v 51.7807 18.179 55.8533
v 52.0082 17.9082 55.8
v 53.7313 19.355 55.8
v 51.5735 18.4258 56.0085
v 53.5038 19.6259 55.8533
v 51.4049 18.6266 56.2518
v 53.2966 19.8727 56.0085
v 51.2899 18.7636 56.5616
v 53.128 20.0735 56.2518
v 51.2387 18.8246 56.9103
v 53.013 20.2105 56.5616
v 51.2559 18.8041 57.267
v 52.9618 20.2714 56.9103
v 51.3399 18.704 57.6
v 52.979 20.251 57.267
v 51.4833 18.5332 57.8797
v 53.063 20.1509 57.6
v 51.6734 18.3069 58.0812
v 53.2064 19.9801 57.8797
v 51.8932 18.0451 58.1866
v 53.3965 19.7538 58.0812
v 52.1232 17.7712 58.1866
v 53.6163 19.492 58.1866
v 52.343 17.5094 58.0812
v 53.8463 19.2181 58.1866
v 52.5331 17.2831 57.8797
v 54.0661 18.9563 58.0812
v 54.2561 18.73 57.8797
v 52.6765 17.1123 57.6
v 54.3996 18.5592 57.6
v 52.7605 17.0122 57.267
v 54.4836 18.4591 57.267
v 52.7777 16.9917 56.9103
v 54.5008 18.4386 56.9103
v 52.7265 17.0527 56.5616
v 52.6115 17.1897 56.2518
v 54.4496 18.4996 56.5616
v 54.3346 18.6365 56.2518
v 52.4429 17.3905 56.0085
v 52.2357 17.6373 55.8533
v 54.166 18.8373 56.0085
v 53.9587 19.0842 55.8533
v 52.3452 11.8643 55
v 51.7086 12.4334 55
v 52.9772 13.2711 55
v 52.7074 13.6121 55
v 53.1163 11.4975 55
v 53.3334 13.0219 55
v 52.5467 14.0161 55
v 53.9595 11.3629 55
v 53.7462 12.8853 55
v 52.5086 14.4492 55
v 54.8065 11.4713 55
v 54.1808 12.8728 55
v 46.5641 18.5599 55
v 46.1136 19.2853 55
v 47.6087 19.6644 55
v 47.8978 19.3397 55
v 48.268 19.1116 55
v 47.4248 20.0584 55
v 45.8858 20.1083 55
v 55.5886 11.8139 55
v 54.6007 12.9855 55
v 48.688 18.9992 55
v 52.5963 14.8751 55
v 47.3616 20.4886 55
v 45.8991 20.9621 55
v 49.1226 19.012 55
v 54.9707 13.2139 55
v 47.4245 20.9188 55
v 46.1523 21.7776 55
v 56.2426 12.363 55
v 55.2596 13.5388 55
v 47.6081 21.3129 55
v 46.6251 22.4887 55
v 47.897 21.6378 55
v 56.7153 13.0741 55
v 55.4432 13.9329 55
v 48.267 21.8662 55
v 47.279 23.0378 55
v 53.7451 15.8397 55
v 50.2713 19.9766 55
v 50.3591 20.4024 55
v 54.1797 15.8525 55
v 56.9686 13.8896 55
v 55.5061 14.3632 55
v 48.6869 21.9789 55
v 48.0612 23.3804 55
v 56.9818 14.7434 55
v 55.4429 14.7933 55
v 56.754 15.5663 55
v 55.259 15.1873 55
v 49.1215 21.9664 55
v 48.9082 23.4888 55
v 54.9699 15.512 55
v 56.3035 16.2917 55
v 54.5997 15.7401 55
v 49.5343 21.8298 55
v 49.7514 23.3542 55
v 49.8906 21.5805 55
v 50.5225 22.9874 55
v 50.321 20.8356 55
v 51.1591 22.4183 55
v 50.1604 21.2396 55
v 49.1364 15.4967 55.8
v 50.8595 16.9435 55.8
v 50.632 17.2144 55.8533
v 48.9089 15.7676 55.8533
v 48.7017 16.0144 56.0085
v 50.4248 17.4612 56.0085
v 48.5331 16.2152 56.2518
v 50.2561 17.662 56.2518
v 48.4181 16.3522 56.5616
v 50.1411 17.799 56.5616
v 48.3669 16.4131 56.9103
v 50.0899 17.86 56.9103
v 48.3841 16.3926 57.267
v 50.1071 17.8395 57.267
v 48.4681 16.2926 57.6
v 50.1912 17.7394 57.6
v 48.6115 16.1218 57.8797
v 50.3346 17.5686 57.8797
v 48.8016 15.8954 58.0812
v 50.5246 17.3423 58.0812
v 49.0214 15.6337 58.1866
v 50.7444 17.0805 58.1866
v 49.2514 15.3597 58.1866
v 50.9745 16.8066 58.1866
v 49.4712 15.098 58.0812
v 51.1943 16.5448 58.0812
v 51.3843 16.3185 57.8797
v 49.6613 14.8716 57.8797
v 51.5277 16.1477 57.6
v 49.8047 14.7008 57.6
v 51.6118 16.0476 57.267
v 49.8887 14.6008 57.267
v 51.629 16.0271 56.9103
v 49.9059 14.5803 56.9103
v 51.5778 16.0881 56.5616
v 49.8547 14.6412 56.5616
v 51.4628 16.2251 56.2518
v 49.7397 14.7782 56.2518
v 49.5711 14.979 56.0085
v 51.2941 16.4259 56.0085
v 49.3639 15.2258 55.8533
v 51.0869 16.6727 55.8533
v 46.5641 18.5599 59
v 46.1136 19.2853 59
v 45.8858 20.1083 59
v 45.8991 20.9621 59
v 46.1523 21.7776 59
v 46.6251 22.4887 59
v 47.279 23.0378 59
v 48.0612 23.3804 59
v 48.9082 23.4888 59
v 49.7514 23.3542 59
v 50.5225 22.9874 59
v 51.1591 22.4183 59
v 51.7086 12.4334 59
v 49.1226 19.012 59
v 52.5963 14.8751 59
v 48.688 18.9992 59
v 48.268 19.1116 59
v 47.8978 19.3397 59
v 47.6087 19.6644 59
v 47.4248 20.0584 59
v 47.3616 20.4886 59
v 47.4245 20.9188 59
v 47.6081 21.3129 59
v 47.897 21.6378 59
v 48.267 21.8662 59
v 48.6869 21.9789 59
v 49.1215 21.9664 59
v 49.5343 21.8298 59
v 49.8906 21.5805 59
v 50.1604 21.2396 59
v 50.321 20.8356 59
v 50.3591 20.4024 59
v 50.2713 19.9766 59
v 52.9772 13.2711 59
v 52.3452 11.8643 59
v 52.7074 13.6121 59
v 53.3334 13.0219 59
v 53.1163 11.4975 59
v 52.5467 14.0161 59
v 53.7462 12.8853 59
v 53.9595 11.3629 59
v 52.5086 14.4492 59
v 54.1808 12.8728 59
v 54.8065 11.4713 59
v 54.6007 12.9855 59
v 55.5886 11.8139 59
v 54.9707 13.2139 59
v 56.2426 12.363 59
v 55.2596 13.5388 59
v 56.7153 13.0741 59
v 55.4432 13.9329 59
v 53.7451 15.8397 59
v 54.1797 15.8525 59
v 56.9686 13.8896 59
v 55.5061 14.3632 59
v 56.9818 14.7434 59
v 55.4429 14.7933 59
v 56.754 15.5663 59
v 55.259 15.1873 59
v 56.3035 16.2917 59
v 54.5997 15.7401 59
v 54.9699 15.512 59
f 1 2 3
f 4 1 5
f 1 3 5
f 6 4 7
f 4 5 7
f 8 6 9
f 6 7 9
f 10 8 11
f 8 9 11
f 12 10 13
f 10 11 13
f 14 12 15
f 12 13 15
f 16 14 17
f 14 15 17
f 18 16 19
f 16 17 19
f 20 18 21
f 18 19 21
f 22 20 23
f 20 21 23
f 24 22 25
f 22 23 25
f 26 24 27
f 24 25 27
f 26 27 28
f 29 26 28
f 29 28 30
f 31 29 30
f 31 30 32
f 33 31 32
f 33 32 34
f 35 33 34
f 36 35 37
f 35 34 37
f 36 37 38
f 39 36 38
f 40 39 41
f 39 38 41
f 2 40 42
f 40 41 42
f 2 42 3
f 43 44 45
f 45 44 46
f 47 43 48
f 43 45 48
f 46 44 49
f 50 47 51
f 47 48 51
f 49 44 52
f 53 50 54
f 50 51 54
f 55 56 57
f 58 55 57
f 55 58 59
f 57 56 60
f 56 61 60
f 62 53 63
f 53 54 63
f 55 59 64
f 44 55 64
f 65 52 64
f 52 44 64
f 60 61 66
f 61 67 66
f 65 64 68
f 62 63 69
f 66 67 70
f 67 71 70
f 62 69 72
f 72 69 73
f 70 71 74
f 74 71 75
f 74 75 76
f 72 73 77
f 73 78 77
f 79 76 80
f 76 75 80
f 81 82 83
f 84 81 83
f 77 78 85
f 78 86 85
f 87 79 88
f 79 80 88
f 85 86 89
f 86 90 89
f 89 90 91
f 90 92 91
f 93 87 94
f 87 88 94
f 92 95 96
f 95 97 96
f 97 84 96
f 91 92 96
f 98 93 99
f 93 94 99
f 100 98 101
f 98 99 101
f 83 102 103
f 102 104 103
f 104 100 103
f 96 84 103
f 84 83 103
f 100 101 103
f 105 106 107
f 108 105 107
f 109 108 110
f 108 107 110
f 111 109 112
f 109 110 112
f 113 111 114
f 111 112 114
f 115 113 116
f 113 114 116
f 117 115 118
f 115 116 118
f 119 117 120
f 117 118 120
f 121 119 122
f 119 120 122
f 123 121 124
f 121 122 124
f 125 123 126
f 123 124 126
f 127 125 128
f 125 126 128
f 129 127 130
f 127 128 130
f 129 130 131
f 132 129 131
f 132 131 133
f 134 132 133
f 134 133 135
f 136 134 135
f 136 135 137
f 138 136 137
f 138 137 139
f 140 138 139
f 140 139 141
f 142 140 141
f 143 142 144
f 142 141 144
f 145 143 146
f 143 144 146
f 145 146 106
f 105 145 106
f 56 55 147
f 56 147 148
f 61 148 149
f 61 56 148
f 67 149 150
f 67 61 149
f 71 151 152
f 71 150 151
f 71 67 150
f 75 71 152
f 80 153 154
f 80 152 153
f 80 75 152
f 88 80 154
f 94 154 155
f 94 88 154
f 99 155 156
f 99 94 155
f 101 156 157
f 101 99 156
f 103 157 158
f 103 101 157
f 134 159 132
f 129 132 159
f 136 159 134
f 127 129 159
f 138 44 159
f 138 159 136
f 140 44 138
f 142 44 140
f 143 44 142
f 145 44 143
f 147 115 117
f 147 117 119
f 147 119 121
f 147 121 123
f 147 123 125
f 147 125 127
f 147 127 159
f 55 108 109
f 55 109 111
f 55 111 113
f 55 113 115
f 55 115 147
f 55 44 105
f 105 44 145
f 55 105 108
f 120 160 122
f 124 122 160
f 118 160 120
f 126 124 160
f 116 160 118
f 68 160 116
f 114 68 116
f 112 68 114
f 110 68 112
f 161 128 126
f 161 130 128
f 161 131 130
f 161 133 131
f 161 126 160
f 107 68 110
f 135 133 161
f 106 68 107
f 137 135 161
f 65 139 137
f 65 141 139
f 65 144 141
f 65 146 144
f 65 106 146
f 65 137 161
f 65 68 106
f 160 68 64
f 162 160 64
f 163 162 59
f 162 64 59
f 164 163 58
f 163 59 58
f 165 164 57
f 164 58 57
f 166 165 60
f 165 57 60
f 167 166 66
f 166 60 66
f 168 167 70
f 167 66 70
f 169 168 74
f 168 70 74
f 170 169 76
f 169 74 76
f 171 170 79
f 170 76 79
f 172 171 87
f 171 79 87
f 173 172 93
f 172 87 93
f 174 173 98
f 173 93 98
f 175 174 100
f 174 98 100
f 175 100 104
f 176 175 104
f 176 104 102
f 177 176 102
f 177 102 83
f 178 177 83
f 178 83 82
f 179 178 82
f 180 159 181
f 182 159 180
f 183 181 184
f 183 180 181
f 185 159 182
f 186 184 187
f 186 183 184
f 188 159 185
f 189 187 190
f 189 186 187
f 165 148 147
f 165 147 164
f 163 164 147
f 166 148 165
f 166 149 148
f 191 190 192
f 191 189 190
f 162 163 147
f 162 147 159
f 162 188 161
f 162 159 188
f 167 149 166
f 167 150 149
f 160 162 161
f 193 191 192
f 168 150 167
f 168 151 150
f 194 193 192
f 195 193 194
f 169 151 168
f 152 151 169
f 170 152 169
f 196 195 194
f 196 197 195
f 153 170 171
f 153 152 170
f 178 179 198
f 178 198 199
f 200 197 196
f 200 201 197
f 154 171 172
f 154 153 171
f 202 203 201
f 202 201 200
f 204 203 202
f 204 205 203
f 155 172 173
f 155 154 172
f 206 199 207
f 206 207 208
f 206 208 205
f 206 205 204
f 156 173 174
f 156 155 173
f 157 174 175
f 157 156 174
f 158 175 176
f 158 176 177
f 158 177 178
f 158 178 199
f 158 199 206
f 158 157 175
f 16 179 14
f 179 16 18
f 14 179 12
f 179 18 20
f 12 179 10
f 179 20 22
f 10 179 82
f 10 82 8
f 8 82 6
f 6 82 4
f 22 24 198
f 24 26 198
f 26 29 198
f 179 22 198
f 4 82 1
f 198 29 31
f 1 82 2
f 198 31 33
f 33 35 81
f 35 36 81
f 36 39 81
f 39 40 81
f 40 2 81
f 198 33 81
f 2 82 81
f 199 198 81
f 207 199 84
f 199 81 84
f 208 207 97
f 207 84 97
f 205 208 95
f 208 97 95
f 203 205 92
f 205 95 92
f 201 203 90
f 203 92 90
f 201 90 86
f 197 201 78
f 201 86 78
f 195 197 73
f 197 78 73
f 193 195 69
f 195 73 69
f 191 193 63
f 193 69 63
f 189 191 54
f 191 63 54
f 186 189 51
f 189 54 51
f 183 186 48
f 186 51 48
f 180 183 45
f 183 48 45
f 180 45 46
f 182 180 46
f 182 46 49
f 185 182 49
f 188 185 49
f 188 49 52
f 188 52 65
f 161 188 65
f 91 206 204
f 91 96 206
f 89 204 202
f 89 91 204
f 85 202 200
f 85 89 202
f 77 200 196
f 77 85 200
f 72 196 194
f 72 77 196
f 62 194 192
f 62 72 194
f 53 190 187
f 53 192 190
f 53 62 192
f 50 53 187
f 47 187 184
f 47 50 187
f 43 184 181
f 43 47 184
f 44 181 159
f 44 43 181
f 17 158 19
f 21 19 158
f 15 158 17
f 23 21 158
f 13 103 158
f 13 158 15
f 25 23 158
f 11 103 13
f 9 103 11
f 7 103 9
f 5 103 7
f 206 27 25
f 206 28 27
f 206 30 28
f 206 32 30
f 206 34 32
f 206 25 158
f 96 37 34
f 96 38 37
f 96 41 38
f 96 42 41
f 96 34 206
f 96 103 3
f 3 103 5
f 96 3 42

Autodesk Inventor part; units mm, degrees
ref_plane "YZ Plane" through (0, 0, 0) normal (1, 0, 0) x (0, 1, 0)
ref_plane "XZ Plane" through (0, 0, 0) normal (0, 1, 0) x (-1, 0, 0)
ref_plane "XY Plane" through (0, 0, 0) normal (0, 0, 1) x (1, 0, 0)
ref_plane "Work Plane1" through (60.6116, 29.9097, 55) normal (0, 0, 1) x (1, 0, 0)
sketch "Sketch1" plane through (60.6116, 29.9097, 55) normal (0, 0, 1) x (1, 0, 0)
  circle A0 centre (-11.75, -9.4206) radius 1.5 projected
  circle A1 centre (-6.6055, -15.5471) radius 1.5 projected
  arc A2 (-9.4525, -7.4914) -> (-14.0475, -11.3498) centre (-11.75, -9.4206) ccw
  arc A3 (-8.903, -17.4763) -> (-4.3081, -13.618) centre (-6.6055, -15.5471) ccw
  line L0 (-9.4525, -7.4914) -> (-4.3081, -13.618)
  line L1 (-8.903, -17.4763) -> (-14.0475, -11.3498)
  line L2 (-11.489, -10.8977) -> (-8.0153, -15.0346)
  line L3 (-10.3403, -9.9331) -> (-6.8665, -14.07)
  line L4 (-11.75, -9.4206) -> (-6.6055, -15.5471) construction
  point P0 (-60.6116, -29.9097)
  dimension "d0" = 6
  dimension "d1" = 6
  dimension "d2" = 1.5
extrude "Extrusion1" add sketch "Sketch1" along normal blind 4
sketch "Sketch2" plane through (51.7087, 12.4334, 55) normal (-0.7658175, -0.643058, 0) x (0, 0, 1)
  line L0 (4, 0) -> (4, 8) projected
  line L1 (4, 4) -> (0, 4) construction
  line L2 (0, 6.701) -> (0, 1.299) projected
  line L3 (0, 0) -> (4, 0) projected
  line L4 (2, 0) -> (2, 8) construction
  line L5 (0, 8) -> (4, 8) projected
  point P0 (-55, 23.7299)
  point P1 (2, 4)
hole "Hole1" at (49.1364, 15.4967, 57) direction (0.7658175, 0.643058, 0) diameter 2.4 end through all clearance for "Countersunk Head GOST 12876-67" size "M2" standard "GOST"
properties part number "rail_holder"
